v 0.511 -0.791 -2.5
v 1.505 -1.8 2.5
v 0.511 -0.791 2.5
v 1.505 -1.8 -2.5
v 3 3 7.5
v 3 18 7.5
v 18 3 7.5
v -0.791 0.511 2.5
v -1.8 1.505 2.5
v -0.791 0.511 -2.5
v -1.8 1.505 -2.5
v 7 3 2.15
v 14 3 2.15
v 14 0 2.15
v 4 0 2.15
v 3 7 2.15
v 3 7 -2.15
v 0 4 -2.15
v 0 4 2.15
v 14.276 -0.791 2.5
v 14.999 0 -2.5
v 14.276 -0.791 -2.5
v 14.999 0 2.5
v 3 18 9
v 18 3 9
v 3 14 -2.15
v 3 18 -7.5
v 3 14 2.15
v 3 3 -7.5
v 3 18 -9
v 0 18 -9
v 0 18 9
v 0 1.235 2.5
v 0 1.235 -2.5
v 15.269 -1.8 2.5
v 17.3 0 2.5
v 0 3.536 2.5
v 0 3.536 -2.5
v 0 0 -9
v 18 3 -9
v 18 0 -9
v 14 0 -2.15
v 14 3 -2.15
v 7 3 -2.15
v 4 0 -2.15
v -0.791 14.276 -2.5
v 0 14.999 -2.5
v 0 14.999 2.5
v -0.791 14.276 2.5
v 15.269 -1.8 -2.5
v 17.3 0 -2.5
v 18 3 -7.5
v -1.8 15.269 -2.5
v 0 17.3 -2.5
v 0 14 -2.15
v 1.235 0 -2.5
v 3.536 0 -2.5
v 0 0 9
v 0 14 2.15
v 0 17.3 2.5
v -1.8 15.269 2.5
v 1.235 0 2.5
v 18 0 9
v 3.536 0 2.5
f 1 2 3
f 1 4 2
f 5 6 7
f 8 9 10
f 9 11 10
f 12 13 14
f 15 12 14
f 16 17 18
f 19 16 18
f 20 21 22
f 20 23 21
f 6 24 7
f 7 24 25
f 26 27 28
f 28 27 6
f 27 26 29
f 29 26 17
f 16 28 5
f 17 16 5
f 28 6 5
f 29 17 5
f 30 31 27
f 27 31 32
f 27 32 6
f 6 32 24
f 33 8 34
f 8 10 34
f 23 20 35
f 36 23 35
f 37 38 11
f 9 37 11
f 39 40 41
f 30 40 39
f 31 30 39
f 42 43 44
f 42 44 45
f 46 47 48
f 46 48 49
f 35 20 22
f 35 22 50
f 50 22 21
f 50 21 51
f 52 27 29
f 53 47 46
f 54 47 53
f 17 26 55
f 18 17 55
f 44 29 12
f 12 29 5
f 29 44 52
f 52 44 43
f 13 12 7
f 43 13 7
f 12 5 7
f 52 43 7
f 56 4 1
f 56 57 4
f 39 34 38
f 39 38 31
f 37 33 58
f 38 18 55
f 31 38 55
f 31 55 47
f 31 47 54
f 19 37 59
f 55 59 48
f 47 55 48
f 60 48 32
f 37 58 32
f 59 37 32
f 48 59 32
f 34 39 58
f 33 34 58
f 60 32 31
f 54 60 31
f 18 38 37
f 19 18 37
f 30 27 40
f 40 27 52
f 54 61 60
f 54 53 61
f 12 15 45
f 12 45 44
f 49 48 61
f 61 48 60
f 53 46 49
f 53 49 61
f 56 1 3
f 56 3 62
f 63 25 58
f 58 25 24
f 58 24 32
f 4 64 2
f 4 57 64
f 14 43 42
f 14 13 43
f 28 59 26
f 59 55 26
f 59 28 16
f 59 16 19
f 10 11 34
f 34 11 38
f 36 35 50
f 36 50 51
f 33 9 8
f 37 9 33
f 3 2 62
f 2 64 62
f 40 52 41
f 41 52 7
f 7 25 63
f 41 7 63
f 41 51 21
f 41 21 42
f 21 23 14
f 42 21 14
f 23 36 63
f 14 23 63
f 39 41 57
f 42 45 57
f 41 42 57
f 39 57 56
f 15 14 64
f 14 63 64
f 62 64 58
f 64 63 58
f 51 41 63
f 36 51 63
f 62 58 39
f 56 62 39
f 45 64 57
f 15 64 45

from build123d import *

# Parameters (mm, degrees)
BOSS_EXTRUDE1_DEPTH = 9
CUT_EXTRUDE1_DEPTH  = 7.5
CUT_EXTRUDE2_DEPTH  = 2.15
BOSS_EXTRUDE2_DEPTH = 2.5


with BuildPart() as part:
    # Sketch1 → Boss-Extrude1 (new body, symmetric)
    with BuildSketch(Plane.XY):
        Polygon((0, 0), (0, 18), (3, 18), (18, 3), (18, 0), align=None)
    extrude(amount=BOSS_EXTRUDE1_DEPTH, both=True)

    # Sketch2 → Cut-Extrude1 (cut, symmetric)
    with BuildSketch(Plane.XY):
        Polygon((3, 18), (3, 3), (18, 3), align=None)
    extrude(amount=CUT_EXTRUDE1_DEPTH, both=True, mode=Mode.SUBTRACT)

    # Sketch3 → Cut-Extrude2 (cut, symmetric)
    with BuildSketch(Plane.XY):
        Polygon((0, 14), (3, 14), (3, 7), (0, 4), align=None)
        Polygon((7, 3), (14, 3), (14, 0), (4, 0), align=None)
    extrude(amount=CUT_EXTRUDE2_DEPTH, both=True, mode=Mode.SUBTRACT)

    # Sketch4 → Boss-Extrude2 (add, symmetric)
    with BuildSketch(Plane.XY):
        Polygon((1.504575227, -1.8), (0.511249685, -0.790946088), (1.234750477, 0), (3.535533906, 0), align=None)
        Polygon((0, 3.535533906), (-1.8, 1.504575227), (-0.790946088, 0.511249685), (0, 1.234750477), align=None)
        Polygon((0, 17.3), (0, 14.999216572), (-0.790946088, 14.275715779), (-1.8, 15.269041321), align=None)
        Polygon((14.999216572, 0), (14.275715779, -0.790946088), (15.269041321, -1.8), (17.3, 0), align=None)
    extrude(amount=BOSS_EXTRUDE2_DEPTH, both=True)


solid = part.part
